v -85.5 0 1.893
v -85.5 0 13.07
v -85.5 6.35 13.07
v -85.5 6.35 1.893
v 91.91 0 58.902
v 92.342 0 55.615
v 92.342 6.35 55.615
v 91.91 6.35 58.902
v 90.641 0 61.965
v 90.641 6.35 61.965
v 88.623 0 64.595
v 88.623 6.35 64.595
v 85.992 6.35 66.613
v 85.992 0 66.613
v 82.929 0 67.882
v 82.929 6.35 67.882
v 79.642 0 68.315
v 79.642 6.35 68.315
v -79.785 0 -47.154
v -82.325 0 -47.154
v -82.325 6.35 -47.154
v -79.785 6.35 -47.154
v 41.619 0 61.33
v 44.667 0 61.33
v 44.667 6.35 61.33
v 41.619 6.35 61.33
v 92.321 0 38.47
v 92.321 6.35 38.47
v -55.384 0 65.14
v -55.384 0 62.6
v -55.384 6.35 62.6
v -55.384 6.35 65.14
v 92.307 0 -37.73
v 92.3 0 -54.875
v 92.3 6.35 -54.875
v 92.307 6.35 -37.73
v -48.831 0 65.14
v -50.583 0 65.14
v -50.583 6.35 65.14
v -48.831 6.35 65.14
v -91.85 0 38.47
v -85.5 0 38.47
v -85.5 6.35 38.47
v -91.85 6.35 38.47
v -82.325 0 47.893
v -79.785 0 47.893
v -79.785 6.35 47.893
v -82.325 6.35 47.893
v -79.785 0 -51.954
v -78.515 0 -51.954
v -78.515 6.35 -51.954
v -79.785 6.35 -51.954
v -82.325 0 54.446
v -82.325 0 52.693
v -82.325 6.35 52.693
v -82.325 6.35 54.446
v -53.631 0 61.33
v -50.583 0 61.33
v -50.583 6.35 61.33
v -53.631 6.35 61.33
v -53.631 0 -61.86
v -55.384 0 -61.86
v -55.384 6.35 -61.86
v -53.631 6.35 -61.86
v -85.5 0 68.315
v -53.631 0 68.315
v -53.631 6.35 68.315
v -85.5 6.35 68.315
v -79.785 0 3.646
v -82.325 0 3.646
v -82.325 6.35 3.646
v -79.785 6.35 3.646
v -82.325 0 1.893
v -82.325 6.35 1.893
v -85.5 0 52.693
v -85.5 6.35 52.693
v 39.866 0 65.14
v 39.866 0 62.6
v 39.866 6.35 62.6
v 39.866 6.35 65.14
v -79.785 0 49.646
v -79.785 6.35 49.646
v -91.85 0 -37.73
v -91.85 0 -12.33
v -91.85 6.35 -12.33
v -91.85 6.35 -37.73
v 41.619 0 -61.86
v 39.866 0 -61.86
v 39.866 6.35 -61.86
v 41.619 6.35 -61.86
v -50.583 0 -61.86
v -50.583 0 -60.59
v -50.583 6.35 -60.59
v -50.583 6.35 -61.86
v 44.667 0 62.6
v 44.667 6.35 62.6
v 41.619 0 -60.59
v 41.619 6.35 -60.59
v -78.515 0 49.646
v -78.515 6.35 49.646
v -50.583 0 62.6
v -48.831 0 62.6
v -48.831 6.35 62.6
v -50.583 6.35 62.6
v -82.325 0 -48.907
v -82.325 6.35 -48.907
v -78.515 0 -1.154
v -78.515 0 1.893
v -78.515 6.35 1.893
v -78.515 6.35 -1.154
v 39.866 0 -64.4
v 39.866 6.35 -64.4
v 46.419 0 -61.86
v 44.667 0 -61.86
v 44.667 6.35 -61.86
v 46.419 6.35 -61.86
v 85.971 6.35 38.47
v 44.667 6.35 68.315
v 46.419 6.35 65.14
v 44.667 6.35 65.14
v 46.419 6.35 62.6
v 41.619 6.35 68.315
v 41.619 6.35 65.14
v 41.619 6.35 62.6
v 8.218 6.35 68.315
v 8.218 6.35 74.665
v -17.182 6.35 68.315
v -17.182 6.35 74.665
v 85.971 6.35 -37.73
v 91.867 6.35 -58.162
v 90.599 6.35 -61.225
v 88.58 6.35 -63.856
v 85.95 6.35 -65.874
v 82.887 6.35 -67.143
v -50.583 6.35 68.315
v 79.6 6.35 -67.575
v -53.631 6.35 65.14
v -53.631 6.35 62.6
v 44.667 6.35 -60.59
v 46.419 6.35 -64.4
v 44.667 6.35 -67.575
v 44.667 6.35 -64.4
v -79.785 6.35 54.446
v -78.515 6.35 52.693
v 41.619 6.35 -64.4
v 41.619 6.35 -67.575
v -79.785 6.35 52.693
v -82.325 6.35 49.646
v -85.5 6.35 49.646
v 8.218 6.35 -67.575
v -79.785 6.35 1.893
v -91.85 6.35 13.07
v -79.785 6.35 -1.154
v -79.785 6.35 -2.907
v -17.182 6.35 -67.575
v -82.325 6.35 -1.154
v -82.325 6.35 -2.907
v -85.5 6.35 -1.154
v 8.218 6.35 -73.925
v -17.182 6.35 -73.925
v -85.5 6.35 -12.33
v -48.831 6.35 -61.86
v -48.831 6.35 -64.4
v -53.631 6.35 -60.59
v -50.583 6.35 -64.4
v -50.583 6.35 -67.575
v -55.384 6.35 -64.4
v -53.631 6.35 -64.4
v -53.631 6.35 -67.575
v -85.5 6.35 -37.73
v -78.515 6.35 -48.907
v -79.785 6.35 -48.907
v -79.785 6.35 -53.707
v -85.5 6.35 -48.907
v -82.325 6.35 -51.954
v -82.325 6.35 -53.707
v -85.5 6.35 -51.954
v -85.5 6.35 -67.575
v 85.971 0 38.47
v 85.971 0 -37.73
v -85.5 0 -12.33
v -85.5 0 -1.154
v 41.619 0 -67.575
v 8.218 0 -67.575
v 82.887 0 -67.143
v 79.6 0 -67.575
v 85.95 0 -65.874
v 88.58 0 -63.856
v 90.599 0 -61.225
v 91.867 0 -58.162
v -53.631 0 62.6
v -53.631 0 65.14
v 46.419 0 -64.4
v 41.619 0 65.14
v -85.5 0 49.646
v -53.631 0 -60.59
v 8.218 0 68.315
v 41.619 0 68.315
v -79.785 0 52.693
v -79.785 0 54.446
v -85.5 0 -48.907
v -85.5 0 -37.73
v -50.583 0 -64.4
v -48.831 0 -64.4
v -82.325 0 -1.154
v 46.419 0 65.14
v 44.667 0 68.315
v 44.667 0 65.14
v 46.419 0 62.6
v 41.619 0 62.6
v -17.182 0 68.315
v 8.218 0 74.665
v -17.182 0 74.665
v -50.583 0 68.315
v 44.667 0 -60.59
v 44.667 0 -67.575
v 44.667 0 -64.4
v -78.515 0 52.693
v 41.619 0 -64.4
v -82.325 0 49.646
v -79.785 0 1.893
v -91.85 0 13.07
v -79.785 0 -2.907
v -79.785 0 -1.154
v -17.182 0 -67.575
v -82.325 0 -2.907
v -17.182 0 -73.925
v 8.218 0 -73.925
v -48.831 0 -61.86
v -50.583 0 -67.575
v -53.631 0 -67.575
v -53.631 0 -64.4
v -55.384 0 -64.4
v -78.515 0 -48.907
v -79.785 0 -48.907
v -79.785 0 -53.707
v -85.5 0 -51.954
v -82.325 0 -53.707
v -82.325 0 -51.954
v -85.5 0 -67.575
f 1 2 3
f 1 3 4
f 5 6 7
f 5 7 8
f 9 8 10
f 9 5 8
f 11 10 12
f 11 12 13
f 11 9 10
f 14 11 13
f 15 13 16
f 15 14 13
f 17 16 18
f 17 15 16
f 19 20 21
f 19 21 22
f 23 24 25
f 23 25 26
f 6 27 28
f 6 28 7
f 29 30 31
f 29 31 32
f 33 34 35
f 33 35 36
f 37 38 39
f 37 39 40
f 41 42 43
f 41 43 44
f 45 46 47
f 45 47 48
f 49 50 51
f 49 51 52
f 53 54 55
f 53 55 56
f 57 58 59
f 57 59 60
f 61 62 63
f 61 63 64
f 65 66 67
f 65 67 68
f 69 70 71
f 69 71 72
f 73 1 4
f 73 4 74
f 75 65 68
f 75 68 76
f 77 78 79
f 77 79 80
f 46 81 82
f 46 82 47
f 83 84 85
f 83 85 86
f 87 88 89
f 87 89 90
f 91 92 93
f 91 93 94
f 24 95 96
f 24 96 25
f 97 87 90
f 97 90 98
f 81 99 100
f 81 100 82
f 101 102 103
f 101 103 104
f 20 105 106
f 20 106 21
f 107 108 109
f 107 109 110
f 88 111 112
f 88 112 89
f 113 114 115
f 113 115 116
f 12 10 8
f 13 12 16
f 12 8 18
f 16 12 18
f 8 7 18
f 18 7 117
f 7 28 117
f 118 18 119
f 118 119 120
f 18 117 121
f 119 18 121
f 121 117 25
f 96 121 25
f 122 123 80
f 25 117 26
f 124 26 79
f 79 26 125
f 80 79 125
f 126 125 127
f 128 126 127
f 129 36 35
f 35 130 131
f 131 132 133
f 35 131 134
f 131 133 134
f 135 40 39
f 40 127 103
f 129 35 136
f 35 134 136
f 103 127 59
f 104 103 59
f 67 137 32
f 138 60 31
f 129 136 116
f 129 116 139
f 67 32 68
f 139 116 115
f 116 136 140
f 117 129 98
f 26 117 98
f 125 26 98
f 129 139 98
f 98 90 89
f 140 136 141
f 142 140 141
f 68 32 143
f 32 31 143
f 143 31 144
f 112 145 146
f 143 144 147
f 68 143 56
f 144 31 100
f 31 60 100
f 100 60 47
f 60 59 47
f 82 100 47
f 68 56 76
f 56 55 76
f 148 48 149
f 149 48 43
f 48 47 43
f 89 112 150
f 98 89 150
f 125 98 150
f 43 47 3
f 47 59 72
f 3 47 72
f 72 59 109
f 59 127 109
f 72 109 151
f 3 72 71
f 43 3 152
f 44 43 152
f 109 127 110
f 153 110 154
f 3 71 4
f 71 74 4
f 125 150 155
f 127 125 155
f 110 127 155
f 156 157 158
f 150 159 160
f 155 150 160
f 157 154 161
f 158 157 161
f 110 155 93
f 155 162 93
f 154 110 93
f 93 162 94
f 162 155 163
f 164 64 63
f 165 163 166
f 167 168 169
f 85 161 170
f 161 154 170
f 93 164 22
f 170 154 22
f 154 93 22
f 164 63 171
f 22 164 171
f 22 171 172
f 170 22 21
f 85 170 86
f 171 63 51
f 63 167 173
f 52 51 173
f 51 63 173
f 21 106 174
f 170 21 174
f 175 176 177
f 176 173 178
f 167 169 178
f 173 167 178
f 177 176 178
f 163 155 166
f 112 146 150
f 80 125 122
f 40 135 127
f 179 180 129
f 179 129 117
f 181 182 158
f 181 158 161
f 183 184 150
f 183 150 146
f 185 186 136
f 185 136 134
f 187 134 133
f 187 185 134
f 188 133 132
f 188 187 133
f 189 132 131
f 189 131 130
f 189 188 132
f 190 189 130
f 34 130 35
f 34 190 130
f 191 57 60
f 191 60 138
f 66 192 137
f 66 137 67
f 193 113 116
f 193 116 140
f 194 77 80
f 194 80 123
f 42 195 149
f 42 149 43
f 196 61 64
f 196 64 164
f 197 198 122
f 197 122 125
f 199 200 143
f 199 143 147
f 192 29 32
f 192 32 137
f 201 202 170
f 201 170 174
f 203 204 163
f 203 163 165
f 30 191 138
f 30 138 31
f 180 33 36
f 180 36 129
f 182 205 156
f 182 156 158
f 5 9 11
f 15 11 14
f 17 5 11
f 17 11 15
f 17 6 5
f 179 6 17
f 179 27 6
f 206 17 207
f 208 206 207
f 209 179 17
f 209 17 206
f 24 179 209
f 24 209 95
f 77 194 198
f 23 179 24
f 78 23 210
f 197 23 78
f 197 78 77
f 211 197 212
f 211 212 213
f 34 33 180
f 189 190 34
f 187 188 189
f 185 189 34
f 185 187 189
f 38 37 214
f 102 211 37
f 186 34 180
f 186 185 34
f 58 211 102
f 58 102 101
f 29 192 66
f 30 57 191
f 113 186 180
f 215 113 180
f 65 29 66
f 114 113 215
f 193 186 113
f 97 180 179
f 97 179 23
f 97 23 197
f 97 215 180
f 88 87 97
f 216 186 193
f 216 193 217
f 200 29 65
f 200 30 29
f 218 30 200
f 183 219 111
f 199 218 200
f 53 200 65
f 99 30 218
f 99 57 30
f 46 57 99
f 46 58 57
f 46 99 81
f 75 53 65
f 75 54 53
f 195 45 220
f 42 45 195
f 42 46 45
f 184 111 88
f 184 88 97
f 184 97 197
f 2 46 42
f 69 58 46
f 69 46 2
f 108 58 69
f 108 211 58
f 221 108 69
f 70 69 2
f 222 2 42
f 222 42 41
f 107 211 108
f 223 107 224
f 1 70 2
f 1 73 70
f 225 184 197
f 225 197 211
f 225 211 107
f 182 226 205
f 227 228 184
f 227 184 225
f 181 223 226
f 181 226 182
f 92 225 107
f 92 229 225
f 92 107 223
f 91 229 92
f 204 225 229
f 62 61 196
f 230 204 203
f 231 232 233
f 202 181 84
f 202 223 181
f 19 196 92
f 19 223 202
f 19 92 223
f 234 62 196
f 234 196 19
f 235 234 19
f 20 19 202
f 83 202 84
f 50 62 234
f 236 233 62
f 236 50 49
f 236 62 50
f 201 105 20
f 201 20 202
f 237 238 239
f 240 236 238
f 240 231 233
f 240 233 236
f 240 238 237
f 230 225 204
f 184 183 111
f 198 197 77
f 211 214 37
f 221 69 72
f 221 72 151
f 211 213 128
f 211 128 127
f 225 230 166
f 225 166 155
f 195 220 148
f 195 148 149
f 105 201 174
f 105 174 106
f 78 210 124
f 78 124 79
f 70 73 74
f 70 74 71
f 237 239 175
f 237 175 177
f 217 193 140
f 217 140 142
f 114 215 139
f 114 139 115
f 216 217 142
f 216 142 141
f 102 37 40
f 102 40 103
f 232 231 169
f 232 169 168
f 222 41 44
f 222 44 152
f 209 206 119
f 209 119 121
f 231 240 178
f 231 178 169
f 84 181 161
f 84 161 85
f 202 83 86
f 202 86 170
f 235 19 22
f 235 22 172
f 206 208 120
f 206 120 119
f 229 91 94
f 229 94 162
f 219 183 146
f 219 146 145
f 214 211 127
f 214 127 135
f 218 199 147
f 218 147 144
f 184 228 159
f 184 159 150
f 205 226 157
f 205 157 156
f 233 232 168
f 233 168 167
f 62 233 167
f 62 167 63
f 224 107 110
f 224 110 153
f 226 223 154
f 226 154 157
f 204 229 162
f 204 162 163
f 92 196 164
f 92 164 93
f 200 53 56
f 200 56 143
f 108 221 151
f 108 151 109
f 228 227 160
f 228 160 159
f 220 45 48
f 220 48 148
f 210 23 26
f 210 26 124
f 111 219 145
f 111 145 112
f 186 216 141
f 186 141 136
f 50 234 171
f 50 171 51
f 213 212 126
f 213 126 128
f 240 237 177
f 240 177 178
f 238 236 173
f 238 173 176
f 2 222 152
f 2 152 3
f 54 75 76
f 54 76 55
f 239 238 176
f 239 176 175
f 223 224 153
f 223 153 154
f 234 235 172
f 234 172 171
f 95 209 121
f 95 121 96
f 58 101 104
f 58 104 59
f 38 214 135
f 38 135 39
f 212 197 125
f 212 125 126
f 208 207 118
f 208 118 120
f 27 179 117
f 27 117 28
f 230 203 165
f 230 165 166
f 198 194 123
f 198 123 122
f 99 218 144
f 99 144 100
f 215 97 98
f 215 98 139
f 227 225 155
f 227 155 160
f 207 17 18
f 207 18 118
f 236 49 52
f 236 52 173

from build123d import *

# Parameters (mm, degrees)
BOSS_EXTRUDE1_DEPTH = 6.35


with BuildPart() as part:
    # Sketch1 → Boss-Extrude1 (new body)
    with BuildSketch(Plane(origin=(0, 0, 0), x_dir=(1, 0, 0), z_dir=(0, 1, 0))):
        with BuildLine():
            Line((-85.499768134, 67.575454856), (-53.631298012, 67.575454856))
            Line((-53.631298012, 67.575454856), (-53.631298012, 64.400454856))
            Line((-53.631298012, 64.400454856), (-55.383898012, 64.400454856))
            Line((-55.383898012, 64.400454856), (-55.383898012, 61.860454856))
            Line((-55.383898012, 61.860454856), (-53.631298012, 61.860454856))
            Line((-53.631298012, 61.860454856), (-53.631298012, 60.590454856))
            Line((-53.631298012, 60.590454856), (-50.583438656, 60.590454856))
            Line((-50.583438656, 60.590454856), (-50.583438656, 61.860454856))
            Line((-50.583438656, 61.860454856), (-48.830838656, 61.860454856))
            Line((-48.830838656, 61.860454856), (-48.830838656, 64.400454856))
            Line((-48.830838656, 64.400454856), (-50.583438656, 64.400454856))
            Line((-50.583438656, 64.400454856), (-50.583438656, 67.575454856))
            Line((-50.583438656, 67.575454856), (-17.182368334, 67.575454856))
            Line((-17.182368334, 67.575454856), (-17.182368334, 73.925454856))
            Line((-17.182368334, 73.925454856), (8.217631666, 73.925454856))
            Line((8.217631666, 73.925454856), (8.217631666, 67.575454856))
            Line((8.217631666, 67.575454856), (41.618701988, 67.575454856))
            Line((41.618701988, 67.575454856), (41.618701988, 64.400454856))
            Line((41.618701988, 64.400454856), (39.866101988, 64.400454856))
            Line((39.866101988, 64.400454856), (39.866101988, 61.860454856))
            Line((39.866101988, 61.860454856), (41.618701988, 61.860454856))
            Line((41.618701988, 61.860454856), (41.618701988, 60.590454856))
            Line((41.618701988, 60.590454856), (44.666561344, 60.590454856))
            Line((44.666561344, 60.590454856), (44.666561344, 61.860454856))
            Line((44.666561344, 61.860454856), (46.419161344, 61.860454856))
            Line((46.419161344, 61.860454856), (46.419161344, 64.400454856))
            Line((46.419161344, 64.400454856), (44.666561344, 64.400454856))
            Line((44.666561344, 64.400454856), (44.666561344, 67.575454856))
            Line((44.666561344, 67.575454856), (79.600231866, 67.575454856))
            ThreePointArc((79.600231866, 67.575454856), (88.580487987, 63.855710977), (92.300231866, 54.875454856))
            Line((92.300231866, 54.875454856), (92.306789937, 37.730454856))
            Line((92.306789937, 37.730454856), (85.971363429, 37.730454856))
            Line((85.971363429, 37.730454856), (85.971363429, -38.469545144))
            Line((85.971363429, -38.469545144), (92.321363429, -38.469545144))
            Line((92.321363429, -38.469545144), (92.342494993, -55.614545144))
            ThreePointArc((92.342494993, -55.614545144), (88.622751114, -64.594801265), (79.642494993, -68.314545144))
            Line((79.642494993, -68.314545144), (44.666561344, -68.314545144))
            Line((44.666561344, -68.314545144), (44.666561344, -65.139545144))
            Line((44.666561344, -65.139545144), (46.419161344, -65.139545144))
            Line((46.419161344, -65.139545144), (46.419161344, -62.599545144))
            Line((46.419161344, -62.599545144), (44.666561344, -62.599545144))
            Line((44.666561344, -62.599545144), (44.666561344, -61.329545144))
            Line((44.666561344, -61.329545144), (41.618701988, -61.329545144))
            Line((41.618701988, -61.329545144), (41.618701988, -62.599545144))
            Line((41.618701988, -62.599545144), (39.866101988, -62.599545144))
            Line((39.866101988, -62.599545144), (39.866101988, -65.139545144))
            Line((39.866101988, -65.139545144), (41.618701988, -65.139545144))
            Line((41.618701988, -65.139545144), (41.618701988, -68.314545144))
            Line((41.618701988, -68.314545144), (8.217631666, -68.314545144))
            Line((8.217631666, -68.314545144), (8.217631666, -74.664545144))
            Line((8.217631666, -74.664545144), (-17.182368334, -74.664545144))
            Line((-17.182368334, -74.664545144), (-17.182368334, -68.314545144))
            Line((-17.182368334, -68.314545144), (-50.583438656, -68.314545144))
            Line((-50.583438656, -68.314545144), (-50.583438656, -65.139545144))
            Line((-50.583438656, -65.139545144), (-48.830838656, -65.139545144))
            Line((-48.830838656, -65.139545144), (-48.830838656, -62.599545144))
            Line((-48.830838656, -62.599545144), (-50.583438656, -62.599545144))
            Line((-50.583438656, -62.599545144), (-50.583438656, -61.329545144))
            Line((-50.583438656, -61.329545144), (-53.631298012, -61.329545144))
            Line((-53.631298012, -61.329545144), (-53.631298012, -62.599545144))
            Line((-53.631298012, -62.599545144), (-55.383898012, -62.599545144))
            Line((-55.383898012, -62.599545144), (-55.383898012, -65.139545144))
            Line((-55.383898012, -65.139545144), (-53.631298012, -65.139545144))
            Line((-53.631298012, -65.139545144), (-53.631298012, -68.314545144))
            Line((-53.631298012, -68.314545144), (-85.499768134, -68.314545144))
            Line((-85.499768134, -68.314545144), (-85.499768134, -52.693474822))
            Line((-85.499768134, -52.693474822), (-82.324768134, -52.693474822))
            Line((-82.324768134, -52.693474822), (-82.324768134, -54.446074822))
            Line((-82.324768134, -54.446074822), (-79.784768134, -54.446074822))
            Line((-79.784768134, -54.446074822), (-79.784768134, -52.693474822))
            Line((-79.784768134, -52.693474822), (-78.514768134, -52.693474822))
            Line((-78.514768134, -52.693474822), (-78.514768134, -49.645615466))
            Line((-78.514768134, -49.645615466), (-79.784768134, -49.645615466))
            Line((-79.784768134, -49.645615466), (-79.784768134, -47.893015466))
            Line((-79.784768134, -47.893015466), (-82.324768134, -47.893015466))
            Line((-82.324768134, -47.893015466), (-82.324768134, -49.645615466))
            Line((-82.324768134, -49.645615466), (-85.499768134, -49.645615466))
            Line((-85.499768134, -49.645615466), (-85.499768134, -38.469545144))
            Line((-85.499768134, -38.469545144), (-91.849768134, -38.469545144))
            Line((-91.849768134, -38.469545144), (-91.849768134, -13.069545144))
            Line((-91.849768134, -13.069545144), (-85.499768134, -13.069545144))
            Line((-85.499768134, -13.069545144), (-85.499768134, -1.893474822))
            Line((-85.499768134, -1.893474822), (-82.324768134, -1.893474822))
            Line((-82.324768134, -1.893474822), (-82.324768134, -3.646074822))
            Line((-82.324768134, -3.646074822), (-79.784768134, -3.646074822))
            Line((-79.784768134, -3.646074822), (-79.784768134, -1.893474822))
            Line((-79.784768134, -1.893474822), (-78.514768134, -1.893474822))
            Line((-78.514768134, -1.893474822), (-78.514768134, 1.154384534))
            Line((-78.514768134, 1.154384534), (-79.784768134, 1.154384534))
            Line((-79.784768134, 1.154384534), (-79.784768134, 2.906984534))
            Line((-79.784768134, 2.906984534), (-82.324768134, 2.906984534))
            Line((-82.324768134, 2.906984534), (-82.324768134, 1.154384534))
            Line((-82.324768134, 1.154384534), (-85.499768134, 1.154384534))
            Line((-85.499768134, 1.154384534), (-85.499768134, 12.330454856))
            Line((-85.499768134, 12.330454856), (-91.849768134, 12.330454856))
            Line((-91.849768134, 12.330454856), (-91.849768134, 37.730454856))
            Line((-91.849768134, 37.730454856), (-85.499768134, 37.730454856))
            Line((-85.499768134, 37.730454856), (-85.499768134, 48.906525178))
            Line((-85.499768134, 48.906525178), (-82.324768134, 48.906525178))
            Line((-82.324768134, 48.906525178), (-82.324768134, 47.153925178))
            Line((-82.324768134, 47.153925178), (-79.784768134, 47.153925178))
            Line((-79.784768134, 47.153925178), (-79.784768134, 48.906525178))
            Line((-79.784768134, 48.906525178), (-78.514768134, 48.906525178))
            Line((-78.514768134, 48.906525178), (-78.514768134, 51.954384534))
            Line((-78.514768134, 51.954384534), (-79.784768134, 51.954384534))
            Line((-79.784768134, 51.954384534), (-79.784768134, 53.706984534))
            Line((-79.784768134, 53.706984534), (-82.324768134, 53.706984534))
            Line((-82.324768134, 53.706984534), (-82.324768134, 51.954384534))
            Line((-82.324768134, 51.954384534), (-85.499768134, 51.954384534))
            Line((-85.499768134, 51.954384534), (-85.499768134, 67.575454856))
        make_face()
    extrude(amount=BOSS_EXTRUDE1_DEPTH)


solid = part.part
